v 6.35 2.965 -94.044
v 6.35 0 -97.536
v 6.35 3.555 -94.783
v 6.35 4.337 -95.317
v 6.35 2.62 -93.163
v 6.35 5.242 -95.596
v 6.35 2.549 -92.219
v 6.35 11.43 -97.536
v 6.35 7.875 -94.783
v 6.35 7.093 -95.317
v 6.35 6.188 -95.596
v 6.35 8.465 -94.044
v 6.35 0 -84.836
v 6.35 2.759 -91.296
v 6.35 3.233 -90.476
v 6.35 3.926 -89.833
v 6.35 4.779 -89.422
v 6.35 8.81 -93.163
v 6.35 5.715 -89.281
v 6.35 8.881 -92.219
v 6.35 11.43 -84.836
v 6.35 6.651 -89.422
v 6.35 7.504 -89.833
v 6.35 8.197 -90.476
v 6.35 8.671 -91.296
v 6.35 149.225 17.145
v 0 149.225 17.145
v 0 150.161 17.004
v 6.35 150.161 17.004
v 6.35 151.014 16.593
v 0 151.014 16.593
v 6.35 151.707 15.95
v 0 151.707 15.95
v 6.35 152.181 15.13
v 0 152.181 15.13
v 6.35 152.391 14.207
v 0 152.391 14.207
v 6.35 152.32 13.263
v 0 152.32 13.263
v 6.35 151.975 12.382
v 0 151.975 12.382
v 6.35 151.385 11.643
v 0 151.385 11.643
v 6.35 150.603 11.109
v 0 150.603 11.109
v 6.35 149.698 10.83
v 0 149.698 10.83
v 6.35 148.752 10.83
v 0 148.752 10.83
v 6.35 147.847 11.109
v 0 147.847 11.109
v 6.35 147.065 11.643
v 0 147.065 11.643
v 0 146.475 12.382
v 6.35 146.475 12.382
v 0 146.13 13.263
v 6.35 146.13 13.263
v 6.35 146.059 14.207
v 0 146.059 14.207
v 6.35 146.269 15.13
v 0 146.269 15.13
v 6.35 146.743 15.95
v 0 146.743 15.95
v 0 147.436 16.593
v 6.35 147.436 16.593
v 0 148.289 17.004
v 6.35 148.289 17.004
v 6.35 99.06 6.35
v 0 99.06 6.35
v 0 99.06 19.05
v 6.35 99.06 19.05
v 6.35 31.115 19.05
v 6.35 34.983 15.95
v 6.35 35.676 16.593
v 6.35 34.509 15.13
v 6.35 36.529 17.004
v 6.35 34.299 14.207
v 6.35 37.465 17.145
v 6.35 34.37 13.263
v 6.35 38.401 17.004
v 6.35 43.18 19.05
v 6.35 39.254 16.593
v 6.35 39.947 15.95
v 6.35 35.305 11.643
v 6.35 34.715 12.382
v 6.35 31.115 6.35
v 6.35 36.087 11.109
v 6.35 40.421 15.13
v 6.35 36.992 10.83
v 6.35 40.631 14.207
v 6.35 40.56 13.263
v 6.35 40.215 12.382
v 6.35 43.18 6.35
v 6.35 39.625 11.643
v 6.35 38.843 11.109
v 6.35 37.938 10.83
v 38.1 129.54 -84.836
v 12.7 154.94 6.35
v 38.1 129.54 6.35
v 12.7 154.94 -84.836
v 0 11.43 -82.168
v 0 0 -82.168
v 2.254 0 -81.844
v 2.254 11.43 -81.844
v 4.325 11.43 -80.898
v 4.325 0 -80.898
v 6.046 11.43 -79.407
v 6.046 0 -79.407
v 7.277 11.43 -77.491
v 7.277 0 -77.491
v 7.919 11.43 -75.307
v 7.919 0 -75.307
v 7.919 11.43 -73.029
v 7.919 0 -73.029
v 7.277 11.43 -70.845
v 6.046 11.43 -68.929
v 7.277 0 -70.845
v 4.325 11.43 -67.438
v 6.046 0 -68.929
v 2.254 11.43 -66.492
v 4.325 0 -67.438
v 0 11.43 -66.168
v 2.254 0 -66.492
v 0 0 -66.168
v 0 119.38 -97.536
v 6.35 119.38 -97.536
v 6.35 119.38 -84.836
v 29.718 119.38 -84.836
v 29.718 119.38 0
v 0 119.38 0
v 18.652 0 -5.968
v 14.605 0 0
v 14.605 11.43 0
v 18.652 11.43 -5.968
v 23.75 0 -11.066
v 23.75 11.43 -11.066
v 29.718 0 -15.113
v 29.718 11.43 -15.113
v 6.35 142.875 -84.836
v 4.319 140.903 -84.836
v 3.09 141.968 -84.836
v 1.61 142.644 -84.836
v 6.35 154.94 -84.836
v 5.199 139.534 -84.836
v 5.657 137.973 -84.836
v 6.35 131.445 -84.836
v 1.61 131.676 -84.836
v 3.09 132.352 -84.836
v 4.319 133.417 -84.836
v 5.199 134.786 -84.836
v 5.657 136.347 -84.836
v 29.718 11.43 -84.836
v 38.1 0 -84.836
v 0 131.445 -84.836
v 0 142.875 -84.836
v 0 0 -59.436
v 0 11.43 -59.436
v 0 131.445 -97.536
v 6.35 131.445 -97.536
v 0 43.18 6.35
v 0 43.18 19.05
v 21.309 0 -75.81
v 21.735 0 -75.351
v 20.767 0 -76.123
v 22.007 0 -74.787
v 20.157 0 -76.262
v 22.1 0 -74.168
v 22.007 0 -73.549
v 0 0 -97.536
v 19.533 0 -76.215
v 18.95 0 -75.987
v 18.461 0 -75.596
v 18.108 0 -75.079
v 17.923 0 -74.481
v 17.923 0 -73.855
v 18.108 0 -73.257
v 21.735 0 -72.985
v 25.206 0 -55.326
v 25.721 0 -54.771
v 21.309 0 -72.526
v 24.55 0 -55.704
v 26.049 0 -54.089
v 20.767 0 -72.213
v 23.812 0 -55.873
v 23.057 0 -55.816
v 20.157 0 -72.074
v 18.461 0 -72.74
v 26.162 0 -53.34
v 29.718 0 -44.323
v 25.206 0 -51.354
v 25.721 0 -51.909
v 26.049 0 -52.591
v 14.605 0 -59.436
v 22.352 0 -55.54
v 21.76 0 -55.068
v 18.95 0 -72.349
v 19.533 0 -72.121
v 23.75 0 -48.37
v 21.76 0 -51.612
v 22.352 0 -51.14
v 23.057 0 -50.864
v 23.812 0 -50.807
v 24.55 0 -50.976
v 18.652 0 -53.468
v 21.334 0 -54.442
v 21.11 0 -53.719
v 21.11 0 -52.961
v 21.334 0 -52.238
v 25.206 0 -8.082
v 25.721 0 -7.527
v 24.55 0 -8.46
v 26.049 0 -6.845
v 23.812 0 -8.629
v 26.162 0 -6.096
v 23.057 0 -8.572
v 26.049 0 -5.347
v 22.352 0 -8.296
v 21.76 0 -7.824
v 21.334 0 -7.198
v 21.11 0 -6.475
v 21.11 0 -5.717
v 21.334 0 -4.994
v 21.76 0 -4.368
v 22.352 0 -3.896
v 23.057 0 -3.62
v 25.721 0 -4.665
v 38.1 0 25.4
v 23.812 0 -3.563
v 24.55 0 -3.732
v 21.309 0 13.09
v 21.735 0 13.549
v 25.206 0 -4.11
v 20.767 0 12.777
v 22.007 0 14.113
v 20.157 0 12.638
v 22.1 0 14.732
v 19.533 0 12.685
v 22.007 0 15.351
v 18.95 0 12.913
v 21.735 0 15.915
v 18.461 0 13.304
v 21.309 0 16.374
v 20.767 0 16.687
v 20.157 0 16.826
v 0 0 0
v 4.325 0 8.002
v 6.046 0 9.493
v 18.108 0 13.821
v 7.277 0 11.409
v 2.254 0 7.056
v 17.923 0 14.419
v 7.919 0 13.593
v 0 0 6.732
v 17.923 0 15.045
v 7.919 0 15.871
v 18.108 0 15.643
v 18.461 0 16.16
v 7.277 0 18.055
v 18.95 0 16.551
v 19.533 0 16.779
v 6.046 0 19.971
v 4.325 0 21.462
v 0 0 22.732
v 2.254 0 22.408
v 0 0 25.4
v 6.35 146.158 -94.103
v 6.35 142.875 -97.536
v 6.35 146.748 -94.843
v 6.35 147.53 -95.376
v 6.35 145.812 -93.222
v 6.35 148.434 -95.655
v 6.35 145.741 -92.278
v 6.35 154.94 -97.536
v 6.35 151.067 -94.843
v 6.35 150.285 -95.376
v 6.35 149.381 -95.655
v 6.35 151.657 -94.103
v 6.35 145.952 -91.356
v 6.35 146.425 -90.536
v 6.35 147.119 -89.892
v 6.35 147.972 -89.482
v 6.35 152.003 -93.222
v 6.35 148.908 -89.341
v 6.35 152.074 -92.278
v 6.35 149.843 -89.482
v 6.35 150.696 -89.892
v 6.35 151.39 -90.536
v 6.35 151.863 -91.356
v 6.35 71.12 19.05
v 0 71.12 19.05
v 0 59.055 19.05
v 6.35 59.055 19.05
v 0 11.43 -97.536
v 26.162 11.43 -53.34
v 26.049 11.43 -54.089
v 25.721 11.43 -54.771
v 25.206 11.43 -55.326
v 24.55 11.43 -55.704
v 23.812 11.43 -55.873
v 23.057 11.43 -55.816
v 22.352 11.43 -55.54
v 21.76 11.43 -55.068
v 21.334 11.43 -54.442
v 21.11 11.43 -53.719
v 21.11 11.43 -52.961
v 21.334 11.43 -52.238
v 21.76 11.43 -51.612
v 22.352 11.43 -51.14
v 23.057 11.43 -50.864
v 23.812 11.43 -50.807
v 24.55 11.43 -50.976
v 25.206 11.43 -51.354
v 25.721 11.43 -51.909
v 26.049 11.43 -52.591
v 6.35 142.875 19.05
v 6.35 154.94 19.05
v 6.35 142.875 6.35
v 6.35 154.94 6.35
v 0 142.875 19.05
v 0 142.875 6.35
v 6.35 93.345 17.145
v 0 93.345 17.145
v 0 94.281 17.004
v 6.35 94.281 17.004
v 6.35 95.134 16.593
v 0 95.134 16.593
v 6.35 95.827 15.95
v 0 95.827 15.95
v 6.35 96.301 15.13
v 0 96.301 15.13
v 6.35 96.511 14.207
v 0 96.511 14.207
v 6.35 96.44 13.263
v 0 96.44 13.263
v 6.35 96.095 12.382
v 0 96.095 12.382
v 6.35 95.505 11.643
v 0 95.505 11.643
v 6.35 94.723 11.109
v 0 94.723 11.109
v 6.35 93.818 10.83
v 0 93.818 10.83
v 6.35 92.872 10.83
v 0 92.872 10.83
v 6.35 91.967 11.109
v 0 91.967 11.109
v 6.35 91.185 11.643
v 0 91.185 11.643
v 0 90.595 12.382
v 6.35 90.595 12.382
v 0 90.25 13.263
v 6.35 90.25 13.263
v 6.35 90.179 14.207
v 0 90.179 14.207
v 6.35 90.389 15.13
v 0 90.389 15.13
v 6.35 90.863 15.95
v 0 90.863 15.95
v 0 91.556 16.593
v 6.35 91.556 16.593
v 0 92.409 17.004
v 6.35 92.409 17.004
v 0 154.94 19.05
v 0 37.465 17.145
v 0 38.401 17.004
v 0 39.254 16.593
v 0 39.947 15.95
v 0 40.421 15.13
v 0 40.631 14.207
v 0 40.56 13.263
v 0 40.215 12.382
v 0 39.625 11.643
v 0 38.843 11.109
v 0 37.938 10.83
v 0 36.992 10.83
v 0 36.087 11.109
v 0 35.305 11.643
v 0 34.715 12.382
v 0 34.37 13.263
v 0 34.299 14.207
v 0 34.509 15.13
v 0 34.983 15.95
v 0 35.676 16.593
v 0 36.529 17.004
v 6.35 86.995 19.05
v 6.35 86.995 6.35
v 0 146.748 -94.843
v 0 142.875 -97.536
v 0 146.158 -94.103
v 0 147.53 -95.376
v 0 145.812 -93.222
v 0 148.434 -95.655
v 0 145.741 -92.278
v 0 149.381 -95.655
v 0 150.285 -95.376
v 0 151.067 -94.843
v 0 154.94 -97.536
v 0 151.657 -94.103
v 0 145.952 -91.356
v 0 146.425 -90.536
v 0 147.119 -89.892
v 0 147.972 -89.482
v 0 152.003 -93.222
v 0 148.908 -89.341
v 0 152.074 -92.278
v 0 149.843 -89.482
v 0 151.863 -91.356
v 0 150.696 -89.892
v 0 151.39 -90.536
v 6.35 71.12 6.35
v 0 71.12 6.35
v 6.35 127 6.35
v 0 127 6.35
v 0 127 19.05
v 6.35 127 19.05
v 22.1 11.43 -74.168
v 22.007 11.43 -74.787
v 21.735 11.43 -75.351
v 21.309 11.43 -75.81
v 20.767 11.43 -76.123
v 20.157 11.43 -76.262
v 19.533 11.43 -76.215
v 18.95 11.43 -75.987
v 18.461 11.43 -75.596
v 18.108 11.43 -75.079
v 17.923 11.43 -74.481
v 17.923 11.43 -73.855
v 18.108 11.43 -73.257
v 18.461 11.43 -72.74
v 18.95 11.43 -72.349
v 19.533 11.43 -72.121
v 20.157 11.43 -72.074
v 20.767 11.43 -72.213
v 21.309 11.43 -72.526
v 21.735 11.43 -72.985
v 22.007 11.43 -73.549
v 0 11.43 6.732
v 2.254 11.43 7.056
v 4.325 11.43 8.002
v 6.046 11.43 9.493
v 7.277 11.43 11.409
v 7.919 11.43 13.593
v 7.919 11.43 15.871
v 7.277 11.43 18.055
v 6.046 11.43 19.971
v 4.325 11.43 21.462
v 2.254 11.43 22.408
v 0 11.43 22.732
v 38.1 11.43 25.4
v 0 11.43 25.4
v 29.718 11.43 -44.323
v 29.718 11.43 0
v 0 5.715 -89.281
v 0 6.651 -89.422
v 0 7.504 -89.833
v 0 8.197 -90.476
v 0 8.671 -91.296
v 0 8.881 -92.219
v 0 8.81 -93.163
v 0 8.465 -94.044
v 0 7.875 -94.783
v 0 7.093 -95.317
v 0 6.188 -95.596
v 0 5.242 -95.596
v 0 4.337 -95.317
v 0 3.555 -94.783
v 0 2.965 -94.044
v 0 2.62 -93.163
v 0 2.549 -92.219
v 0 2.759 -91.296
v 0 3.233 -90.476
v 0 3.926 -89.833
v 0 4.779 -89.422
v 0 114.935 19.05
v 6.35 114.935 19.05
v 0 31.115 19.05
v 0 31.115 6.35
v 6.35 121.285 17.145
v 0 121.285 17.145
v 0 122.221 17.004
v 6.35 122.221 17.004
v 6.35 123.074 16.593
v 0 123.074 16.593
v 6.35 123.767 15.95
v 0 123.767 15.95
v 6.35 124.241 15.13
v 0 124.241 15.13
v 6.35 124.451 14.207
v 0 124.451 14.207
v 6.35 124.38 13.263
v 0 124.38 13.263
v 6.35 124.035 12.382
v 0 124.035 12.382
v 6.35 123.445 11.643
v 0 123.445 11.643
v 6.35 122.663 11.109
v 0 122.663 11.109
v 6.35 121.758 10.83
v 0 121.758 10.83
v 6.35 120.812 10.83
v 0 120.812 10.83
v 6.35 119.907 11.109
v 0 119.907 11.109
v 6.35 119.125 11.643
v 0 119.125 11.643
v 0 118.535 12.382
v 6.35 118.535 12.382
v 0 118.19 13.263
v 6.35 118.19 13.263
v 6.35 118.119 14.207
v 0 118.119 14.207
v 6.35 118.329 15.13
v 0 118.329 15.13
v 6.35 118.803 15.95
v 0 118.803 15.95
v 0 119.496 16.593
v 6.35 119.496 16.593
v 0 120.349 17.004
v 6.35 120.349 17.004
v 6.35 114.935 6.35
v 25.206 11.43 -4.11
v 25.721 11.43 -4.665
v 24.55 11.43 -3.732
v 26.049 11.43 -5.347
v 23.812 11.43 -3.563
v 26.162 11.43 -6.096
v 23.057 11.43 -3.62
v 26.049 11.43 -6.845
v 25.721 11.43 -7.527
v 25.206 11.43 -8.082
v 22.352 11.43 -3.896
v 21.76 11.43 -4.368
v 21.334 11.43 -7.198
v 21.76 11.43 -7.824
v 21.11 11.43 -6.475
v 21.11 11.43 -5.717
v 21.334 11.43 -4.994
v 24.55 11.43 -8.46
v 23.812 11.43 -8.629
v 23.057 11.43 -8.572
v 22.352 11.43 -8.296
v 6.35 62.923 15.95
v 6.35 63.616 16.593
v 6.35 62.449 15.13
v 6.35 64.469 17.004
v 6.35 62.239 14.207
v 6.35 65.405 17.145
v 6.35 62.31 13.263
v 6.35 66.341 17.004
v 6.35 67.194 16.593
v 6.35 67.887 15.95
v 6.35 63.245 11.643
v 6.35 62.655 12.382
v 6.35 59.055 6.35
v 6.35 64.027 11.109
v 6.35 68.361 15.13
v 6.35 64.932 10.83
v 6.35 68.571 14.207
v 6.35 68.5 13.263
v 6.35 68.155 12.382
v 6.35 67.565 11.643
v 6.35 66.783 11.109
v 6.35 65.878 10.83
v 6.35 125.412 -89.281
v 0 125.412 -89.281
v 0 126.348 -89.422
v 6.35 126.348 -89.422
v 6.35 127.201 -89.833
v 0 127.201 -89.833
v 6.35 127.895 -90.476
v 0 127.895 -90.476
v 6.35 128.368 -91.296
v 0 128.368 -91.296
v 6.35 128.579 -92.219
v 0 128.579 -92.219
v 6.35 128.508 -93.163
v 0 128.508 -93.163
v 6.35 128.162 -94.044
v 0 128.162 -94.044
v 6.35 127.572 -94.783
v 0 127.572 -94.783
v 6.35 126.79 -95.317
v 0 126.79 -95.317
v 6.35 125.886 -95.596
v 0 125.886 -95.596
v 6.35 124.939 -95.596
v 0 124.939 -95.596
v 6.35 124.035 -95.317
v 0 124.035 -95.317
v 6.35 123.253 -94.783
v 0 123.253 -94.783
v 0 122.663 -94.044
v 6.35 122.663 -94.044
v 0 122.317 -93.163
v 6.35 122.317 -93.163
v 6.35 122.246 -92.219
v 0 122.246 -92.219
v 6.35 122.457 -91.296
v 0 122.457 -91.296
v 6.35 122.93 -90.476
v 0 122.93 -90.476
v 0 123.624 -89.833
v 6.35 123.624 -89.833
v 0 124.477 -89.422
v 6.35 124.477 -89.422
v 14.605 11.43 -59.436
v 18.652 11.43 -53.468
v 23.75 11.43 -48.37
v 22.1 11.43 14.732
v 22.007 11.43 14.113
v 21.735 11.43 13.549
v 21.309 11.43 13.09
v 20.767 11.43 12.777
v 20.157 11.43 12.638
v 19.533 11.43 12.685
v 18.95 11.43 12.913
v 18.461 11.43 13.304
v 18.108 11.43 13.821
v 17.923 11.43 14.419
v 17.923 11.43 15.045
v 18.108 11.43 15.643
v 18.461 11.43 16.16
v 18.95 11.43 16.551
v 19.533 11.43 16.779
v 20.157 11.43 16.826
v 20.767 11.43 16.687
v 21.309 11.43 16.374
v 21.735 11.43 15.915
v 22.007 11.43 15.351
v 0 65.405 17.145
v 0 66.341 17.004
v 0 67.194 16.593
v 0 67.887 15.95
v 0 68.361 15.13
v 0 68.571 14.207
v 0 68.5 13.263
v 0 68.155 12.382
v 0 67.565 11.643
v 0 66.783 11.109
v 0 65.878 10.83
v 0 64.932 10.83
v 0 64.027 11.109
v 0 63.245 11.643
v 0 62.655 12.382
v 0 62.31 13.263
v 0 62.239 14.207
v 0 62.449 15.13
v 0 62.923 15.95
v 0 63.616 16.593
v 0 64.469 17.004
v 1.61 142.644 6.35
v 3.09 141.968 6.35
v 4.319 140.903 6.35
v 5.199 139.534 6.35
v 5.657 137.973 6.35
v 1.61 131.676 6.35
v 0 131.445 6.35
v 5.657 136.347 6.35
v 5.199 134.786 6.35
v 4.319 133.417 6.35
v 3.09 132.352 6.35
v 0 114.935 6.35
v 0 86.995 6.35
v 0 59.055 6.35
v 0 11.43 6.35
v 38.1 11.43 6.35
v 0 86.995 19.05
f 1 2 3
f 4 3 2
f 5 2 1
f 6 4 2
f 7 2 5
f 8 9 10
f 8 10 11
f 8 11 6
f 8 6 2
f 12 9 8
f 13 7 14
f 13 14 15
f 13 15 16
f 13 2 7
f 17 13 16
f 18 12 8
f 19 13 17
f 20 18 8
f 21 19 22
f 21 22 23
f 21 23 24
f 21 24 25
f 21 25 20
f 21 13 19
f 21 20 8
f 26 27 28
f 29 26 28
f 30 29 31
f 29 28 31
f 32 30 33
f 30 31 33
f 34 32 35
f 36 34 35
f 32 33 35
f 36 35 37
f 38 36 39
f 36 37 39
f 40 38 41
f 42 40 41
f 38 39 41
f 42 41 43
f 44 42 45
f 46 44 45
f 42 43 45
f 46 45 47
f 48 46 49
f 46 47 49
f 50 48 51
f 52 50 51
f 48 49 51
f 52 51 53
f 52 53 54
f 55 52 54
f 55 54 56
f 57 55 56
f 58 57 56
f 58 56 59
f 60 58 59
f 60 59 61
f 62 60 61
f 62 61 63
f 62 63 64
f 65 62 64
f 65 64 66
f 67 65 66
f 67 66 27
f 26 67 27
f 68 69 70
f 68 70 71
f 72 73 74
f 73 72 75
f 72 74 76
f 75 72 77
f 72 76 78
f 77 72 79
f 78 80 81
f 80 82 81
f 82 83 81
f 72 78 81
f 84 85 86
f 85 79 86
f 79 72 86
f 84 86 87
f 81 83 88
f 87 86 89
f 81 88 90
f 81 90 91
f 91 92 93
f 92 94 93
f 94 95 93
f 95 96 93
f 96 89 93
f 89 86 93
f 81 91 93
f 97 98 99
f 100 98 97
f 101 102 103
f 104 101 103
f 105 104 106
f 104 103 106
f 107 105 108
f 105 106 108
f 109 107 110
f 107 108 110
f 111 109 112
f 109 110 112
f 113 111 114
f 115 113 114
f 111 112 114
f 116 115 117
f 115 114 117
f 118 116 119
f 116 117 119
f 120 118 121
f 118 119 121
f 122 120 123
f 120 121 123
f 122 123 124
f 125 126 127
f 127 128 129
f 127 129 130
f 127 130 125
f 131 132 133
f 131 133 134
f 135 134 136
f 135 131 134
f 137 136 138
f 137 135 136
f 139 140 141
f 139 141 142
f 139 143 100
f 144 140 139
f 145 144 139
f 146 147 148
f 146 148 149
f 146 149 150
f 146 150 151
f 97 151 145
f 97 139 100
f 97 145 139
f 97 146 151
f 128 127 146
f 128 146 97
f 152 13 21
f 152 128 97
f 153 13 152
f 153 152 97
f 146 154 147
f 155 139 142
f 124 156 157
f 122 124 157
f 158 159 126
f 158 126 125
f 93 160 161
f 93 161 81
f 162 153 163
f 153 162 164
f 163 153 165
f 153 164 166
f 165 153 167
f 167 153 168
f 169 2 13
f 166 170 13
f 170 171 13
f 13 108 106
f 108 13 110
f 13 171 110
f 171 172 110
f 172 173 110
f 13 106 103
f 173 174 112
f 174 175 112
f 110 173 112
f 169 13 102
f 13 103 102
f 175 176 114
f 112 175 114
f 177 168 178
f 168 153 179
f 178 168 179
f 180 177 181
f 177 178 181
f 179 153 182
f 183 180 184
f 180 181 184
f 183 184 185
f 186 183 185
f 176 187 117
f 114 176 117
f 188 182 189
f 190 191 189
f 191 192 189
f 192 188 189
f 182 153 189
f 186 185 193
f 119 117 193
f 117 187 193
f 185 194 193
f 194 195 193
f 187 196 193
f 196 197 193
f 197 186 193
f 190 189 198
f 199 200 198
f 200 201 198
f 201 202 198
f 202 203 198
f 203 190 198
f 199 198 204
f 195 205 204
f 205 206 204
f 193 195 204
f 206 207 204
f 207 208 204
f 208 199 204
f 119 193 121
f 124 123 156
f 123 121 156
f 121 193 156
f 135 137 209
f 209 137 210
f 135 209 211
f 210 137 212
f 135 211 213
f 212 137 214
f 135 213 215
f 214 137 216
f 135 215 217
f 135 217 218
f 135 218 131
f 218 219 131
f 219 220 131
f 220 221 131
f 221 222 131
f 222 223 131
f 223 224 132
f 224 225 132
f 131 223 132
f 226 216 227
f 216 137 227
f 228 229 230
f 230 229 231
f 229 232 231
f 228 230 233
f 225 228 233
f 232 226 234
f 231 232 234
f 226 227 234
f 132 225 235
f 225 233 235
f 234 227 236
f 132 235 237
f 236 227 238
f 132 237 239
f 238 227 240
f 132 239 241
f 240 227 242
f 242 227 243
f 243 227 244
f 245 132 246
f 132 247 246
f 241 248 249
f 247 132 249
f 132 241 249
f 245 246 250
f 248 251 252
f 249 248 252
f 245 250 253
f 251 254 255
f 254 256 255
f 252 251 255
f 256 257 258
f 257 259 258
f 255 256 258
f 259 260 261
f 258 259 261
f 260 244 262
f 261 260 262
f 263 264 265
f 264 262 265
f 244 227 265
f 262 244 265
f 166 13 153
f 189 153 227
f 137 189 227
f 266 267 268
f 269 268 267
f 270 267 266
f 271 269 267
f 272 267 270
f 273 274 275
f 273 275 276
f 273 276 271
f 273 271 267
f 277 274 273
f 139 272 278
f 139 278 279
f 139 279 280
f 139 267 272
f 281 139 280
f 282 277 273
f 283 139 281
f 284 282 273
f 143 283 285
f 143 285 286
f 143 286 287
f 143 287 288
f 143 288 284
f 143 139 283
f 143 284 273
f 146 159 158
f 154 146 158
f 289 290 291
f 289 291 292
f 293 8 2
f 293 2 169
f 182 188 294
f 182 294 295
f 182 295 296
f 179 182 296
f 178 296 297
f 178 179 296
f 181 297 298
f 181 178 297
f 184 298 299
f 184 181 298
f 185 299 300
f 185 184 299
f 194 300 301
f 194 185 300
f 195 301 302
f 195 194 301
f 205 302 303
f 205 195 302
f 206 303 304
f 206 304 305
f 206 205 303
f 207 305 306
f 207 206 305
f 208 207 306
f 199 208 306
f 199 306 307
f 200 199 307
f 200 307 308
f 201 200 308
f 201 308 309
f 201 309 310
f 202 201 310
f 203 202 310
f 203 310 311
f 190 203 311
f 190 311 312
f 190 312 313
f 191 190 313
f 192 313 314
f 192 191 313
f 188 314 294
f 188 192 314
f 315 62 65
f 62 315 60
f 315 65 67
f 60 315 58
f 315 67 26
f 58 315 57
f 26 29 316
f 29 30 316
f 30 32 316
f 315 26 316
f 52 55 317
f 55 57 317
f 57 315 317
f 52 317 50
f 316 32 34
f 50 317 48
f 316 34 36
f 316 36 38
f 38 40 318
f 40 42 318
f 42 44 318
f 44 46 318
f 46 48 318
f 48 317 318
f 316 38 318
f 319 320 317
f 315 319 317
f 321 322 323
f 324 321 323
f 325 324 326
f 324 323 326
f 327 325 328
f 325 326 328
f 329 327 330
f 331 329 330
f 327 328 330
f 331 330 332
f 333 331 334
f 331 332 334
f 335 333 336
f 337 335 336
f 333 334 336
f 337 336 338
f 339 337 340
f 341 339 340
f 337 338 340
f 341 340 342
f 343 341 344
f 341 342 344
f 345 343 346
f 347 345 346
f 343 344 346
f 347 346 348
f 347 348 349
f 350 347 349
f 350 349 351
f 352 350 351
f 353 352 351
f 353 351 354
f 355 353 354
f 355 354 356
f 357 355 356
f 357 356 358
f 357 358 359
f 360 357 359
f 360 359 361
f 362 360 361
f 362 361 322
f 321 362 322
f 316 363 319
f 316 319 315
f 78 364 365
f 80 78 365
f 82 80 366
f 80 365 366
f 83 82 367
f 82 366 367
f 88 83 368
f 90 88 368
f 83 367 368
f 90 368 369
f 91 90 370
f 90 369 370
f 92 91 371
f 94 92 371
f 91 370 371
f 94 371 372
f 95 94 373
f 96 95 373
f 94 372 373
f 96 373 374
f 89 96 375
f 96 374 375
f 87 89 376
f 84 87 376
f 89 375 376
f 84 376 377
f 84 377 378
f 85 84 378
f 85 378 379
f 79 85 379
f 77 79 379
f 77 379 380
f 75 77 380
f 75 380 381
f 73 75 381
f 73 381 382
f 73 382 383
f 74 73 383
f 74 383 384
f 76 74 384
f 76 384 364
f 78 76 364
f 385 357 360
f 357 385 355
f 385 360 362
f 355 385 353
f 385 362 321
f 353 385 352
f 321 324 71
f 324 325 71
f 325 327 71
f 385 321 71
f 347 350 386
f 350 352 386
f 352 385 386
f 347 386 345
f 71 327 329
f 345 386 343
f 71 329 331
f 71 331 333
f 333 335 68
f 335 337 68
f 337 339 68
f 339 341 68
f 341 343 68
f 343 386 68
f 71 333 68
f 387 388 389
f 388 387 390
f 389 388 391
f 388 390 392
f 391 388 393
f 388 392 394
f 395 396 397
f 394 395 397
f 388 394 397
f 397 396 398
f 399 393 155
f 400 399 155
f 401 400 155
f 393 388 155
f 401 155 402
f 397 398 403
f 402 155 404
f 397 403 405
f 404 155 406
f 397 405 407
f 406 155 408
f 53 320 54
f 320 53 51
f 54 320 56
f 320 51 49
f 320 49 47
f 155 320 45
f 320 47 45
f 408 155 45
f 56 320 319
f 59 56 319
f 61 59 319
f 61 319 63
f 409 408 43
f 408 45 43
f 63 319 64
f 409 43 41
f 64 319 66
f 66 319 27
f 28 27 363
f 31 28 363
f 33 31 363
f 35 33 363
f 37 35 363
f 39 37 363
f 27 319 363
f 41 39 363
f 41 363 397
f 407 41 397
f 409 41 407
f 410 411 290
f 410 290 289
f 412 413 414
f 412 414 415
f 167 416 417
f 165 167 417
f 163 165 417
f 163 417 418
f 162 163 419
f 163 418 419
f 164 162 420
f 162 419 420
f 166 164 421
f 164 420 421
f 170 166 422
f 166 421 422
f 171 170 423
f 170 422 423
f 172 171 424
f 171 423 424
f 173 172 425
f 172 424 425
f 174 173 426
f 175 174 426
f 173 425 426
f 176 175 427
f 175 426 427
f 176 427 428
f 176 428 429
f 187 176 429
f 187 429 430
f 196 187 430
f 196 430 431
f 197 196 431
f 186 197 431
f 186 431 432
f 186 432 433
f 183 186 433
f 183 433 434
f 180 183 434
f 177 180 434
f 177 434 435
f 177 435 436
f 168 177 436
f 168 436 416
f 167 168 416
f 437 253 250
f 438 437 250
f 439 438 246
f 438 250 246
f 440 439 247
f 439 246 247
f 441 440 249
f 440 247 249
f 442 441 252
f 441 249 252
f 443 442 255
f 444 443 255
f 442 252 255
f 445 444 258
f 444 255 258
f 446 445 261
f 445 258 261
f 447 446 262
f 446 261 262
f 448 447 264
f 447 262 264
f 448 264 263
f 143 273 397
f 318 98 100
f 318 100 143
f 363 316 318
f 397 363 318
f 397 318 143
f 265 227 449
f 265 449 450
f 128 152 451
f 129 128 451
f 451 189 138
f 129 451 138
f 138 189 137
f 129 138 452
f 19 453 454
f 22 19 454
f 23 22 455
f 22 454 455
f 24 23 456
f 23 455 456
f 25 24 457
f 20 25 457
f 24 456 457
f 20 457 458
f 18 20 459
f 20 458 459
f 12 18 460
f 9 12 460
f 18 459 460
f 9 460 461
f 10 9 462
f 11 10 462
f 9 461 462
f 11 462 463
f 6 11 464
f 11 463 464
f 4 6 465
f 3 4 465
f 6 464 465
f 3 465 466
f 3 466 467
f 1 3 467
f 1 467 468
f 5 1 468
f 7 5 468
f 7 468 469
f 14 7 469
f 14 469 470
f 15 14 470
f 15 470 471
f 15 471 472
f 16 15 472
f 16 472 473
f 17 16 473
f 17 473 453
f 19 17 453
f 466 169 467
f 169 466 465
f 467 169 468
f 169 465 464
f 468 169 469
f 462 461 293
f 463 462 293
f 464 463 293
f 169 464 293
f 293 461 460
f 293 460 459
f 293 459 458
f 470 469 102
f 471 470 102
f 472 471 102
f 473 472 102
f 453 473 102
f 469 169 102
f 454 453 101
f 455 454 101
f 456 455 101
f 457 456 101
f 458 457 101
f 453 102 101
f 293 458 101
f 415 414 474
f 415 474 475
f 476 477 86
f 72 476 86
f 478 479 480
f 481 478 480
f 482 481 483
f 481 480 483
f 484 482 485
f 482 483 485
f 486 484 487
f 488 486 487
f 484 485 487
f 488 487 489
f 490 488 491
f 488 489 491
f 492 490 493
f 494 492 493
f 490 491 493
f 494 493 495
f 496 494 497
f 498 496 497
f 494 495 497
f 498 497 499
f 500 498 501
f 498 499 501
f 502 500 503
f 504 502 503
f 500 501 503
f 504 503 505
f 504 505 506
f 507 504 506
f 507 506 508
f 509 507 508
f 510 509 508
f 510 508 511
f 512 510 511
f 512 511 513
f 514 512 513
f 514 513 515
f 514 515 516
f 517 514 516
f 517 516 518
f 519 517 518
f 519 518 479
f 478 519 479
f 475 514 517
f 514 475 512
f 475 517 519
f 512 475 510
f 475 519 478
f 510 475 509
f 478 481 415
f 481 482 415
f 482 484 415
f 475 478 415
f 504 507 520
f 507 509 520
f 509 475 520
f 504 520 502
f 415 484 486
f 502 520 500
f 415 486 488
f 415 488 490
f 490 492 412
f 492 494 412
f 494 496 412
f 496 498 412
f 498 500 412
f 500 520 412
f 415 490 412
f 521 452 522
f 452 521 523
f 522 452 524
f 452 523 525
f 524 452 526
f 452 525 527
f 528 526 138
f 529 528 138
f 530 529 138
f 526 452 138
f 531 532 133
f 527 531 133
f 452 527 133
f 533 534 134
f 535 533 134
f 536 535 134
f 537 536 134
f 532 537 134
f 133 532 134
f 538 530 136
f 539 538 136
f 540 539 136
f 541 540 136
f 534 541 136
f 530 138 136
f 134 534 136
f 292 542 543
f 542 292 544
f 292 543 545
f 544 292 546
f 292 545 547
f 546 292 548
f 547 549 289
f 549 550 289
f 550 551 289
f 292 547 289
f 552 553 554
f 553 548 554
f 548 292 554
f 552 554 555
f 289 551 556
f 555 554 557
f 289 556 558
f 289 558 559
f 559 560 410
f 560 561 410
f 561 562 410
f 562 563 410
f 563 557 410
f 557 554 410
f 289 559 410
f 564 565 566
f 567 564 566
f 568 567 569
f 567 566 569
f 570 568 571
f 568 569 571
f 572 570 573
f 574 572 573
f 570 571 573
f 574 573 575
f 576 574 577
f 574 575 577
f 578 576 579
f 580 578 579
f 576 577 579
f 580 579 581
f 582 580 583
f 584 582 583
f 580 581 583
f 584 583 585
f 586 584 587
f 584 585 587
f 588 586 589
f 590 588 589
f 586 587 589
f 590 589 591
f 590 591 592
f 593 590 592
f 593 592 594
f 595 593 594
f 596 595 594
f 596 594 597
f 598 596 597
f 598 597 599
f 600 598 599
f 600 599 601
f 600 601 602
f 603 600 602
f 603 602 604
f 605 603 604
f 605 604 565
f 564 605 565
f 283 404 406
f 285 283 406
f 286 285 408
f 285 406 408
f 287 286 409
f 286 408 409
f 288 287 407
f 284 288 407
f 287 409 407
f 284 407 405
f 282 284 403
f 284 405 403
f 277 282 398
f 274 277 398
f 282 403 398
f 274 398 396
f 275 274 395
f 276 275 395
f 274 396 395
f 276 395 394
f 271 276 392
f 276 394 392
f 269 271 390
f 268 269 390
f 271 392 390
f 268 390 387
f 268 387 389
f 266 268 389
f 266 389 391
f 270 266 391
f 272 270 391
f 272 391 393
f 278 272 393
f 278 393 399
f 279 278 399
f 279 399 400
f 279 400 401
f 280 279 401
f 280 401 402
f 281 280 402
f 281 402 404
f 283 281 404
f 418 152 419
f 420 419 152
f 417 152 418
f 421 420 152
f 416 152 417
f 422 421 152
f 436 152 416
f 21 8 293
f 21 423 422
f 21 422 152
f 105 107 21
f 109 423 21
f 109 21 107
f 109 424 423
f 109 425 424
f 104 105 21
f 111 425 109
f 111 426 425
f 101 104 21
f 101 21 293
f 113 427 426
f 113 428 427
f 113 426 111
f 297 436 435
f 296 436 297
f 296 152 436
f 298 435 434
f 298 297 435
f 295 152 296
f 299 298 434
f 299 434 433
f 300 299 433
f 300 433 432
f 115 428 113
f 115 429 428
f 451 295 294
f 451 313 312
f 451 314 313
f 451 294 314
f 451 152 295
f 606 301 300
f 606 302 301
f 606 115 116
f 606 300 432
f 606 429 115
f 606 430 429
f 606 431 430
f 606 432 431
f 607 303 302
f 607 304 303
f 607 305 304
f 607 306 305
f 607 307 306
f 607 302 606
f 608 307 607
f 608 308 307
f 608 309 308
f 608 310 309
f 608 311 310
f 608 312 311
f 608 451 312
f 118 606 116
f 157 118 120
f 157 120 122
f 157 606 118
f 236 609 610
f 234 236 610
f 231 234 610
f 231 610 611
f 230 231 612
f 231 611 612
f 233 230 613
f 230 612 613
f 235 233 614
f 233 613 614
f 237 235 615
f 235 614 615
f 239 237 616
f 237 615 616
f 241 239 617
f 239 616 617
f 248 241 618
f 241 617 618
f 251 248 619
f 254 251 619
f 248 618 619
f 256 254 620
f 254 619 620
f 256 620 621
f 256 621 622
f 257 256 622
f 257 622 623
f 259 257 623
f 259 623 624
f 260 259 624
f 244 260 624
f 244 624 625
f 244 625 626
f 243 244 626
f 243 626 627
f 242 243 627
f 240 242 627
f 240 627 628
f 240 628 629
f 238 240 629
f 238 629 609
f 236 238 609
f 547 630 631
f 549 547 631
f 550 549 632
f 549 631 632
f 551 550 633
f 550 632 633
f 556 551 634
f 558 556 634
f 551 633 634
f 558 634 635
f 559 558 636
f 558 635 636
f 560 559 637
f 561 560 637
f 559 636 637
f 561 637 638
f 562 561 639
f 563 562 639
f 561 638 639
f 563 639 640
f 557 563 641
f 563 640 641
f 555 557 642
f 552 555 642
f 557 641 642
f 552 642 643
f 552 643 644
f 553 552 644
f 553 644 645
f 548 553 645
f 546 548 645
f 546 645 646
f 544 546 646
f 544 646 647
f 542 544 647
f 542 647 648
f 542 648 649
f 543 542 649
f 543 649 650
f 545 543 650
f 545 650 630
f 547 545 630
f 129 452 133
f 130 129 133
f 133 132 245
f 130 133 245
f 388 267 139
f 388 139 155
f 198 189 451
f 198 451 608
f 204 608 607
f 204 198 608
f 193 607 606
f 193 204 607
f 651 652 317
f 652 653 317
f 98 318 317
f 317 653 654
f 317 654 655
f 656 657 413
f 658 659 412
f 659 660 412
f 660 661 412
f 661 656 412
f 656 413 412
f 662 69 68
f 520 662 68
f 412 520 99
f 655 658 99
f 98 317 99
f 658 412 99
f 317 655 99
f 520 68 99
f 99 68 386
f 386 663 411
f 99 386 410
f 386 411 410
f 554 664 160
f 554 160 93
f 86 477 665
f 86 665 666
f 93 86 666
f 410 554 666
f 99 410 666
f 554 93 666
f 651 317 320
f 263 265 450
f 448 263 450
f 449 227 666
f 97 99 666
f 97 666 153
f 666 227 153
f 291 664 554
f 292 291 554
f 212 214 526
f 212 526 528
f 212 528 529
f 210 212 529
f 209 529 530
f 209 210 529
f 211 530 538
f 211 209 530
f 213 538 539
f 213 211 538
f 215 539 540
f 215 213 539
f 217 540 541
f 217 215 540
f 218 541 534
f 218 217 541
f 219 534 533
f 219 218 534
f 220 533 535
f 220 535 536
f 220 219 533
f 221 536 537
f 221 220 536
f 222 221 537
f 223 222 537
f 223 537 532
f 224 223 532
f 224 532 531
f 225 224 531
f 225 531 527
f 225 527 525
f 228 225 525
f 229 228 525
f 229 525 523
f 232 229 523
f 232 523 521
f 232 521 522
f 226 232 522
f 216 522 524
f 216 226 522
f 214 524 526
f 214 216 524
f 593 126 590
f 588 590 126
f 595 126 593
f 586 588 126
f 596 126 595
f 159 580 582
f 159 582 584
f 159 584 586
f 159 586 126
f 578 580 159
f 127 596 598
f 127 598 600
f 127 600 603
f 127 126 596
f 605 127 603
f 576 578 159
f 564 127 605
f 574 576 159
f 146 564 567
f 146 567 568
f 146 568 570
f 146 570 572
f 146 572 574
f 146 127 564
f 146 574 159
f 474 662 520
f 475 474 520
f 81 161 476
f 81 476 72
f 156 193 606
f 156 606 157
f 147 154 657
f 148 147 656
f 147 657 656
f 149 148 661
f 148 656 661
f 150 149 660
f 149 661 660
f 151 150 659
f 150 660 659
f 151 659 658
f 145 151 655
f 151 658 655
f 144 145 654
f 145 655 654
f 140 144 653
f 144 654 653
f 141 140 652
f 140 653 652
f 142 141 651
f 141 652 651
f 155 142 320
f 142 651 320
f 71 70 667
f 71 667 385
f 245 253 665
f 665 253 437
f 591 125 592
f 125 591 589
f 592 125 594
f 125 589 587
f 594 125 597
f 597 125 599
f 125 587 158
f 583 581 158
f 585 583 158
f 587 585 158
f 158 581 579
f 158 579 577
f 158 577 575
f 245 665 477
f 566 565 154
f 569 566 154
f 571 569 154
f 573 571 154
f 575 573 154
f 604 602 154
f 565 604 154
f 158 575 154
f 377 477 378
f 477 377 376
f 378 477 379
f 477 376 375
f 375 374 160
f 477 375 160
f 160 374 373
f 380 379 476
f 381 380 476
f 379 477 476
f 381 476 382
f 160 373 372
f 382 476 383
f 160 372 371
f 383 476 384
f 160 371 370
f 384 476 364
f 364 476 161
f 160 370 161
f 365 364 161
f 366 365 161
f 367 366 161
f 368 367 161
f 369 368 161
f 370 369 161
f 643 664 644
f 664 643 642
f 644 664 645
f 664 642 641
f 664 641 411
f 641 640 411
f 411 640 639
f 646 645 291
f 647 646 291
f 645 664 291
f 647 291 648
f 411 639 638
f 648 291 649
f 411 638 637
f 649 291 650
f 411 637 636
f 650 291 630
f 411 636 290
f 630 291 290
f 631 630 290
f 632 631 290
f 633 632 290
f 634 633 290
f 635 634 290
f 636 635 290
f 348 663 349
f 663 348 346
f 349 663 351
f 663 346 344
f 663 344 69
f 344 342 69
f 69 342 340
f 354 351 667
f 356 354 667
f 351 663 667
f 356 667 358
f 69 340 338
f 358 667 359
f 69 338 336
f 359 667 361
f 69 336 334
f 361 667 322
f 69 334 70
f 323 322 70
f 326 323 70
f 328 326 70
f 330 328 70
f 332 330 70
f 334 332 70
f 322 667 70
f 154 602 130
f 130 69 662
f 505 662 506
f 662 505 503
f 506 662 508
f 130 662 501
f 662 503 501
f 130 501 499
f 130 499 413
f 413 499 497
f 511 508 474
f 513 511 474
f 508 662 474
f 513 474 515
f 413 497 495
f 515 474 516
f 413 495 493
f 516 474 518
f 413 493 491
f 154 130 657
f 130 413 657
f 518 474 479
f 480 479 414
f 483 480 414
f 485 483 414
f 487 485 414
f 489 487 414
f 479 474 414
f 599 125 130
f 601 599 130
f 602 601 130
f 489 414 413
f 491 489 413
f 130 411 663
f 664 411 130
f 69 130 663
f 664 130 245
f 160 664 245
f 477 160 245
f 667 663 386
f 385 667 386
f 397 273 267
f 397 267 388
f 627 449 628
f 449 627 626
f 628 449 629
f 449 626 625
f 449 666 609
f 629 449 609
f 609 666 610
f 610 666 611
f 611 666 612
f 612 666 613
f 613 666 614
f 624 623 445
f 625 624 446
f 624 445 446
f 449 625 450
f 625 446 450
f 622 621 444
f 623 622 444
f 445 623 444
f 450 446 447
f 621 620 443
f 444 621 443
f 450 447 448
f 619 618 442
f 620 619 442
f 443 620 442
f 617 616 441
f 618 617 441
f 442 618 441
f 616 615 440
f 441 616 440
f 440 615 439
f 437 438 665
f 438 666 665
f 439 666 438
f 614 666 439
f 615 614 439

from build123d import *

# Parameters (mm, degrees)
SKETCH1_R                       = 2.54
BOSS_EXTRUDE1_DEPTH             = 11.43
BOSS_EXTRUDE2_DEPTH             = 107.95
SKETCH3_W                       = 38.1
SKETCH3_H                       = 91.186
BOSS_EXTRUDE3_DEPTH             = 35.56
CUT_EXTRUDE1_REACH              = 93.186
SKETCH4_R                       = 5.715
SKETCH5_W                       = 6.35
SKETCH5_H                       = 12.065
BOSS_EXTRUDE4_DEPTH             = 12.7
F_1_4_0_25_DIAMETER_HOLE2_D     = 6.35
F_1_4_0_25_DIAMETER_HOLE2_DEPTH = 6.351
LPATTERN2_COUNT                 = 5
LPATTERN2_PITCH                 = 27.94
SKETCH13_W                      = 6.35
SKETCH13_H                      = 11.43
BOSS_EXTRUDE5_DEPTH             = 12.7
F_1_4_0_25_DIAMETER_HOLE3_D     = 6.35
F_1_4_0_25_DIAMETER_HOLE3_DEPTH = 6.35
SKETCH16_W                      = 6.35
SKETCH16_H                      = 12.065
BOSS_EXTRUDE6_DEPTH             = 12.7
F_1_4_0_25_DIAMETER_HOLE4_D     = 6.35
F_1_4_0_25_DIAMETER_HOLE4_DEPTH = 6.35
SKETCH19_W                      = 6.35
SKETCH19_H                      = 12.065
BOSS_EXTRUDE7_DEPTH             = 12.7
F_1_4_0_25_DIAMETER_HOLE5_D     = 6.35
F_1_4_0_25_DIAMETER_HOLE5_DEPTH = 6.35
CHAMFER1_SIZE                   = 25.4
TAP_DRILL_FOR_M5X0_8_TAP1_D     = 4.2
TAP_DRILL_FOR_M5X0_8_TAP1_DEPTH = 11.43
CUT_EXTRUDE2_REACH              = 156.94
SKETCH24_R                      = 8


with BuildPart() as part:
    # Sketch1 → Boss-Extrude1 (new body)
    with BuildSketch(Plane(origin=(0, 0, 0), x_dir=(1, 0, 0), z_dir=(0, 1, 0))):
        with BuildLine():
            Line((0, 0), (14.605, 0))
            ThreePointArc((14.605, 0), (21.080049256, 8.637950744), (29.718, 15.113))
            Line((29.718, 15.113), (29.718, 44.323))
            ThreePointArc((29.718, 44.323), (21.080049256, 50.798049256), (14.605, 59.436))
            Line((14.605, 59.436), (0, 59.436))
            Line((0, 59.436), (0, 84.836))
            Line((0, 84.836), (38.1, 84.836))
            Line((38.1, 84.836), (38.1, -25.4))
            Line((38.1, -25.4), (0, -25.4))
            Line((0, -25.4), (0, 0))
        make_face()
        with Locations((23.622, 6.096)):
            Circle(SKETCH1_R, mode=Mode.SUBTRACT)
        with Locations((23.622, 53.34)):
            Circle(SKETCH1_R, mode=Mode.SUBTRACT)
    extrude(amount=BOSS_EXTRUDE1_DEPTH)

    # Sketch2 → Boss-Extrude2 (add)
    with BuildSketch(Plane(origin=(0, 11.43, 0), x_dir=(1, 0, 0), z_dir=(0, 1, 0))):
        Polygon((38.1, 84.836), (29.718, 84.836), (29.718, 0), (0, 0), (0, -6.35), (38.1, -6.35), align=None)
    extrude(amount=BOSS_EXTRUDE2_DEPTH)

    # Sketch3 → Boss-Extrude3 (add)
    with BuildSketch(Plane(origin=(0, 119.38, 0), x_dir=(1, 0, 0), z_dir=(0, 1, 0))):
        with Locations((19.05, 39.243)):
            Rectangle(SKETCH3_W, SKETCH3_H)
    extrude(amount=BOSS_EXTRUDE3_DEPTH)

    # Sketch4 → Cut-Extrude1 (cut, up to next)
    with BuildSketch(Plane.XY.offset(6.35), mode=Mode.PRIVATE) as cut_extrude1_sk1:
        with Locations((0, 137.16)):
            Circle(SKETCH4_R)
    cut_extrude1_tool1 = extrude(cut_extrude1_sk1.sketch, amount=-CUT_EXTRUDE1_REACH, mode=Mode.PRIVATE) & part.part
    add(cut_extrude1_tool1.solids().sort_by_distance((0, 137.16, 6.35))[0], mode=Mode.SUBTRACT)

    # Sketch5 → Boss-Extrude4 (add)
    with BuildSketch(Plane.XY.offset(6.35)):
        with Locations((3.175, 148.9075)):
            Rectangle(SKETCH5_W, SKETCH5_H)
    boss_extrude4 = extrude(amount=BOSS_EXTRUDE4_DEPTH)

    # 1/4 (0.25) Diameter Hole2
    with Locations(Plane(origin=(6.35, 0, 0), x_dir=(0, 0, -1), z_dir=(1, 0, 0))):
        with Locations((-13.97, 149.225)):
            f_1_4_0_25_diameter_hole2 = Hole(F_1_4_0_25_DIAMETER_HOLE2_D / 2, depth=F_1_4_0_25_DIAMETER_HOLE2_DEPTH)

    # LPattern2: Boss-Extrude4, 1/4 (0.25) Diameter Hole2 ×5
    with Locations(*[(0, -i * LPATTERN2_PITCH, 0) for i in range(1, LPATTERN2_COUNT)]):
        add(boss_extrude4)
        add(f_1_4_0_25_diameter_hole2, mode=Mode.SUBTRACT)

    # Sketch13 → Boss-Extrude5 (add)
    with BuildSketch(Plane(origin=(0, 0, -84.836), x_dir=(-1, 0, 0), z_dir=(0, 0, -1))):
        with Locations((-3.175, 5.715)):
            Rectangle(SKETCH13_W, SKETCH13_H)
    extrude(amount=BOSS_EXTRUDE5_DEPTH)

    # 1/4 (0.25) Diameter Hole3
    with Locations(Plane(origin=(6.35, 0, 0), x_dir=(0, 0, -1), z_dir=(1, 0, 0))):
        with Locations((92.456, 5.715)):
            Hole(F_1_4_0_25_DIAMETER_HOLE3_D / 2, depth=F_1_4_0_25_DIAMETER_HOLE3_DEPTH)

    # Sketch16 → Boss-Extrude6 (add)
    with BuildSketch(Plane(origin=(0, 0, -84.836), x_dir=(-1, 0, 0), z_dir=(0, 0, -1))):
        with Locations((-3.175, 148.9075)):
            Rectangle(SKETCH16_W, SKETCH16_H)
    extrude(amount=BOSS_EXTRUDE6_DEPTH)

    # 1/4 (0.25) Diameter Hole4
    with Locations(Plane(origin=(6.35, 0, 0), x_dir=(0, 0, -1), z_dir=(1, 0, 0))):
        with Locations((92.515604356, 148.9075)):
            Hole(F_1_4_0_25_DIAMETER_HOLE4_D / 2, depth=F_1_4_0_25_DIAMETER_HOLE4_DEPTH)

    # Sketch19 → Boss-Extrude7 (add)
    with BuildSketch(Plane(origin=(0, 0, -84.836), x_dir=(-1, 0, 0), z_dir=(0, 0, -1))):
        with Locations((-3.175, 125.4125)):
            Rectangle(SKETCH19_W, SKETCH19_H)
    extrude(amount=BOSS_EXTRUDE7_DEPTH)

    # 1/4 (0.25) Diameter Hole5
    with Locations(Plane(origin=(6.35, 0, 0), x_dir=(0, 0, -1), z_dir=(1, 0, 0))):
        with Locations((92.456, 125.4125)):
            Hole(F_1_4_0_25_DIAMETER_HOLE5_D / 2, depth=F_1_4_0_25_DIAMETER_HOLE5_DEPTH)

    # Chamfer1
    chamfer1_edges = [part.edges().sort_by_distance(p)[0] for p in [
        (38.1, 154.94, -39.243),
    ]]
    chamfer(chamfer1_edges, length=CHAMFER1_SIZE)

    # Tap Drill for M5x0.8 Tap1
    with Locations(Plane(origin=(0, 0, 0), x_dir=(-1, 0, 0), z_dir=(0, -1, 0))):
        with Locations((-20, 74.168), (-20, -14.732)):
            Hole(TAP_DRILL_FOR_M5X0_8_TAP1_D / 2, depth=TAP_DRILL_FOR_M5X0_8_TAP1_DEPTH)

    # Sketch24 → Cut-Extrude2 (cut, up to next)
    with BuildSketch(Plane.XZ, mode=Mode.PRIVATE) as cut_extrude2_sk1:
        with Locations((0, -74.168)):
            Circle(SKETCH24_R)
    cut_extrude2_tool1 = extrude(cut_extrude2_sk1.sketch, amount=-CUT_EXTRUDE2_REACH, mode=Mode.PRIVATE) & part.part
    add(cut_extrude2_tool1.solids().sort_by_distance((0, 0, -74.168))[0], mode=Mode.SUBTRACT)
    # Sketch24 → Cut-Extrude2 (cut, up to next)
    with BuildSketch(Plane.XZ, mode=Mode.PRIVATE) as cut_extrude2_sk2:
        with Locations((0, 14.732)):
            Circle(SKETCH24_R)
    cut_extrude2_tool2 = extrude(cut_extrude2_sk2.sketch, amount=-CUT_EXTRUDE2_REACH, mode=Mode.PRIVATE) & part.part
    add(cut_extrude2_tool2.solids().sort_by_distance((0, 0, 14.732))[0], mode=Mode.SUBTRACT)


solid = part.part
